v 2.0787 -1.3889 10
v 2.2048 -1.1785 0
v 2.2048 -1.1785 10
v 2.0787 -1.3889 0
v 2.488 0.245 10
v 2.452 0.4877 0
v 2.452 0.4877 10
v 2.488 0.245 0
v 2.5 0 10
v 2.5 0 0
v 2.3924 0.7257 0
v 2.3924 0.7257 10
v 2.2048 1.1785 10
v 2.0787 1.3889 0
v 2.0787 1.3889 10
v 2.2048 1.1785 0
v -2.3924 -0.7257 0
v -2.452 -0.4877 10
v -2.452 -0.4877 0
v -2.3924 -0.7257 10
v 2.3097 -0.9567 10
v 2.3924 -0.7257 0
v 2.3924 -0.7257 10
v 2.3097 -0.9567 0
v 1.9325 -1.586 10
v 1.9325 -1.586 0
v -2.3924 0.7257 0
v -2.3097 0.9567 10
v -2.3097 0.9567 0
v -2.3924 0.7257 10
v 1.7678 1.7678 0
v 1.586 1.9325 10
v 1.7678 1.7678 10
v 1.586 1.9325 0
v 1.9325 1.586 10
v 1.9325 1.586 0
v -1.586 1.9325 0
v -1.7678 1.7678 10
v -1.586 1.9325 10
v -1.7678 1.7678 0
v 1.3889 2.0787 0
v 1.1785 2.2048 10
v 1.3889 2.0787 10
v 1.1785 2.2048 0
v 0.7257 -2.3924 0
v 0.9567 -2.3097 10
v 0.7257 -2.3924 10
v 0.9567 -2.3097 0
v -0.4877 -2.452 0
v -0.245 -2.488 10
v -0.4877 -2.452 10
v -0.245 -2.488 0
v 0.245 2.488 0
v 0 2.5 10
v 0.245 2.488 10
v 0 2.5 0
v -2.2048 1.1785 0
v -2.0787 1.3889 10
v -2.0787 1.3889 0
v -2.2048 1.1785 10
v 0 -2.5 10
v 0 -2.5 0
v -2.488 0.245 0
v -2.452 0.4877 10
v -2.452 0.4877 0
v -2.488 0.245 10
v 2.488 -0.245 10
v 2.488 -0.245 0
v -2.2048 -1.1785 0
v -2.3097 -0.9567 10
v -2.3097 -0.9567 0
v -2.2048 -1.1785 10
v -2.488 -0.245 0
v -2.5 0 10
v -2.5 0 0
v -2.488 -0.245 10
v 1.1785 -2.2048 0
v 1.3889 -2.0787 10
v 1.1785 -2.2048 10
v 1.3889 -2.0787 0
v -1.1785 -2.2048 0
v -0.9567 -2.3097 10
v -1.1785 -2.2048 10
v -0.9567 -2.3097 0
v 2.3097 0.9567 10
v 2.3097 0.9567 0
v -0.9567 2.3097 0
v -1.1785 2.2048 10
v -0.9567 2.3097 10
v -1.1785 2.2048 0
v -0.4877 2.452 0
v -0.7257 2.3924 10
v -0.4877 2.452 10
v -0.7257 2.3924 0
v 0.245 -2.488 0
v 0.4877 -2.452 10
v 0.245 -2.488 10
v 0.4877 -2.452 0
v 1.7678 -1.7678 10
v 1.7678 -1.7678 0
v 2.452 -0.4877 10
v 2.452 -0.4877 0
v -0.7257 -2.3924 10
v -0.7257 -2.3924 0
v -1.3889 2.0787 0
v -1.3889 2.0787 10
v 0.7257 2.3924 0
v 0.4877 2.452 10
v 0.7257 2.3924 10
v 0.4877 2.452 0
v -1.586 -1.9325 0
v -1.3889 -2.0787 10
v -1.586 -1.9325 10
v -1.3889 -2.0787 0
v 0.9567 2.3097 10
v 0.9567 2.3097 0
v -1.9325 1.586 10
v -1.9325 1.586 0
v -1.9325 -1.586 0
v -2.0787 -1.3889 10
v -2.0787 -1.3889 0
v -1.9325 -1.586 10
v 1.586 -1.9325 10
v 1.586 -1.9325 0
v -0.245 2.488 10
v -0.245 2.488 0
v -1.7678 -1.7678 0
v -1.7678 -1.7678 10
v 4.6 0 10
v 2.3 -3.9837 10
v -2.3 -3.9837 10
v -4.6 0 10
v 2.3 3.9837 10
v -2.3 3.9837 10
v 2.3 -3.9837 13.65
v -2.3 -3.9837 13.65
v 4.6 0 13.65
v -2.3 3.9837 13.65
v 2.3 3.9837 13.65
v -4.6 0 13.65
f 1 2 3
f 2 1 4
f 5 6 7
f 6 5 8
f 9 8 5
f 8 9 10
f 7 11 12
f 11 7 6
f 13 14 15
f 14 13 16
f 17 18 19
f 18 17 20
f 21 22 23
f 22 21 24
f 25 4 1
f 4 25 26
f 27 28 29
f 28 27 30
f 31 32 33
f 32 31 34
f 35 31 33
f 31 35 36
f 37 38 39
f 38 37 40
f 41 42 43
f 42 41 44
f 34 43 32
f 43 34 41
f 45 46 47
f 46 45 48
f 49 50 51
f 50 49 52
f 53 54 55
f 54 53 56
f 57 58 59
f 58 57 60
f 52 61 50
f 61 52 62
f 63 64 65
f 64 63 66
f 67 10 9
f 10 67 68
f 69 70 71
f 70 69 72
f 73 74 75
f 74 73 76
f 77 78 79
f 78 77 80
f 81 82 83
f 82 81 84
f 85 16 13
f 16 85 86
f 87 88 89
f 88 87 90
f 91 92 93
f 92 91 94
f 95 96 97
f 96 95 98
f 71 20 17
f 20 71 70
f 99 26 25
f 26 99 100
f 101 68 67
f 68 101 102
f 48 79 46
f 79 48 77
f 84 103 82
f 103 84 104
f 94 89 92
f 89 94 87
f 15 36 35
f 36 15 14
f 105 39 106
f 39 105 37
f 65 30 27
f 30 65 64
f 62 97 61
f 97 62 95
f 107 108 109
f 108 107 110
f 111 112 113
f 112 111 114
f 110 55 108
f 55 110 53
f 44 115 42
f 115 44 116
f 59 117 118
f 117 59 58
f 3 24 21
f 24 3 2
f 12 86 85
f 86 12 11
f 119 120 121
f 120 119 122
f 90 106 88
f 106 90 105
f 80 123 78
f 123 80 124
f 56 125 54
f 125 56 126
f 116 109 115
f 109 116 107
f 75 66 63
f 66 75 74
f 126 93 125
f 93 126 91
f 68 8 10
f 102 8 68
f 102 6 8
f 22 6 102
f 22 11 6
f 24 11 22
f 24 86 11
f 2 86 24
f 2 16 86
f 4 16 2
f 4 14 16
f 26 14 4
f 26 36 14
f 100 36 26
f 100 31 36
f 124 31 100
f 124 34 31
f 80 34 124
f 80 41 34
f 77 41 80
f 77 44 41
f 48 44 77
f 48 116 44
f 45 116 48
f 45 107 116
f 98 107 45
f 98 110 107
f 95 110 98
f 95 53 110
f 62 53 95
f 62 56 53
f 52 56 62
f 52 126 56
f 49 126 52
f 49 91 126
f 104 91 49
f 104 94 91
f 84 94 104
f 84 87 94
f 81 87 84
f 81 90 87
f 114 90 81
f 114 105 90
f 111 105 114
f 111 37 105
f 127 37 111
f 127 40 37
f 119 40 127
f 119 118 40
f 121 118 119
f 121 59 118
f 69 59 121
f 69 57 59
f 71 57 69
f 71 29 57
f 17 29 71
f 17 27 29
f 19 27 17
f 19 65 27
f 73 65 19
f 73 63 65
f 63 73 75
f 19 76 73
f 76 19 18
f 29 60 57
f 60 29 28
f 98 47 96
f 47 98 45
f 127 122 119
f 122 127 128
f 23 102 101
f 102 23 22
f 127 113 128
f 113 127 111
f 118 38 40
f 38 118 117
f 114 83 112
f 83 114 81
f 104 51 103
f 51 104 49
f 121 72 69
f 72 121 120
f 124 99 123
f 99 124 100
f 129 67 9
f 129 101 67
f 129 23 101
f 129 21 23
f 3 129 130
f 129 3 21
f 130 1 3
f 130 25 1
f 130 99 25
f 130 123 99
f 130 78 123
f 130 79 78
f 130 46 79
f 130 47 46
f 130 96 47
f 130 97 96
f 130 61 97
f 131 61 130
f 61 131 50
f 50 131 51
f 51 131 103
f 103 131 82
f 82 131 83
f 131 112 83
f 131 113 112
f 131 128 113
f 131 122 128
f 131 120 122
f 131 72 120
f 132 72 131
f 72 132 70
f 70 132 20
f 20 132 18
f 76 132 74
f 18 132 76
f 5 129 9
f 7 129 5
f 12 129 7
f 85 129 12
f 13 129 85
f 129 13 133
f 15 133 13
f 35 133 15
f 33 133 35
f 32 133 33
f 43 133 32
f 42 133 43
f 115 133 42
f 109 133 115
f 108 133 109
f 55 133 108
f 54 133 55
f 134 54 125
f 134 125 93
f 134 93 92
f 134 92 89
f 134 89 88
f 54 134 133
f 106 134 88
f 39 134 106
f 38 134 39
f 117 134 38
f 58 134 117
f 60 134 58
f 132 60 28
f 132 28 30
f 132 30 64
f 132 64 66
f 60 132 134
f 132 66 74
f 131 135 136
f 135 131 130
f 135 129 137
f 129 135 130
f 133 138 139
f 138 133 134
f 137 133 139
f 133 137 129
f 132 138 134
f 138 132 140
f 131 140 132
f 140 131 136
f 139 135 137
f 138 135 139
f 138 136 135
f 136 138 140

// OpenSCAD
module hex_head_screw() {
    union() {
        // Screw shaft
        cylinder(h=10, d=5, $fn=64);
        
        // Hexagonal head
        translate([0, 0, 10])
        cylinder(h=3.65, d=9.2, $fn=6);
    }
}

hex_head_screw();
